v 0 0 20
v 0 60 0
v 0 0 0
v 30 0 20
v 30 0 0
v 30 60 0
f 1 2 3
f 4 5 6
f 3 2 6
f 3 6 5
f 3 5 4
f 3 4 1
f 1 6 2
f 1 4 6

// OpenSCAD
polyhedron(
    points = [
               [ 0,  0,  0], // 0
               [ 0, 60,  0], // 1
               [30, 60,  0], // 2
               [30,  0,  0], // 3
               [30,  0, 20], // 4
               [ 0,  0, 20]  // 5
             ],
    faces = [
              // side walls
              [0,1,5],
              [2,3,4],
              // floor
              [2,1,0],
              [3,2,0],
              //back wall
              [4,3,0],
              [5,4,0],
              // front wall
              [1,2,5],
              [2,4,5]
            ]
);
